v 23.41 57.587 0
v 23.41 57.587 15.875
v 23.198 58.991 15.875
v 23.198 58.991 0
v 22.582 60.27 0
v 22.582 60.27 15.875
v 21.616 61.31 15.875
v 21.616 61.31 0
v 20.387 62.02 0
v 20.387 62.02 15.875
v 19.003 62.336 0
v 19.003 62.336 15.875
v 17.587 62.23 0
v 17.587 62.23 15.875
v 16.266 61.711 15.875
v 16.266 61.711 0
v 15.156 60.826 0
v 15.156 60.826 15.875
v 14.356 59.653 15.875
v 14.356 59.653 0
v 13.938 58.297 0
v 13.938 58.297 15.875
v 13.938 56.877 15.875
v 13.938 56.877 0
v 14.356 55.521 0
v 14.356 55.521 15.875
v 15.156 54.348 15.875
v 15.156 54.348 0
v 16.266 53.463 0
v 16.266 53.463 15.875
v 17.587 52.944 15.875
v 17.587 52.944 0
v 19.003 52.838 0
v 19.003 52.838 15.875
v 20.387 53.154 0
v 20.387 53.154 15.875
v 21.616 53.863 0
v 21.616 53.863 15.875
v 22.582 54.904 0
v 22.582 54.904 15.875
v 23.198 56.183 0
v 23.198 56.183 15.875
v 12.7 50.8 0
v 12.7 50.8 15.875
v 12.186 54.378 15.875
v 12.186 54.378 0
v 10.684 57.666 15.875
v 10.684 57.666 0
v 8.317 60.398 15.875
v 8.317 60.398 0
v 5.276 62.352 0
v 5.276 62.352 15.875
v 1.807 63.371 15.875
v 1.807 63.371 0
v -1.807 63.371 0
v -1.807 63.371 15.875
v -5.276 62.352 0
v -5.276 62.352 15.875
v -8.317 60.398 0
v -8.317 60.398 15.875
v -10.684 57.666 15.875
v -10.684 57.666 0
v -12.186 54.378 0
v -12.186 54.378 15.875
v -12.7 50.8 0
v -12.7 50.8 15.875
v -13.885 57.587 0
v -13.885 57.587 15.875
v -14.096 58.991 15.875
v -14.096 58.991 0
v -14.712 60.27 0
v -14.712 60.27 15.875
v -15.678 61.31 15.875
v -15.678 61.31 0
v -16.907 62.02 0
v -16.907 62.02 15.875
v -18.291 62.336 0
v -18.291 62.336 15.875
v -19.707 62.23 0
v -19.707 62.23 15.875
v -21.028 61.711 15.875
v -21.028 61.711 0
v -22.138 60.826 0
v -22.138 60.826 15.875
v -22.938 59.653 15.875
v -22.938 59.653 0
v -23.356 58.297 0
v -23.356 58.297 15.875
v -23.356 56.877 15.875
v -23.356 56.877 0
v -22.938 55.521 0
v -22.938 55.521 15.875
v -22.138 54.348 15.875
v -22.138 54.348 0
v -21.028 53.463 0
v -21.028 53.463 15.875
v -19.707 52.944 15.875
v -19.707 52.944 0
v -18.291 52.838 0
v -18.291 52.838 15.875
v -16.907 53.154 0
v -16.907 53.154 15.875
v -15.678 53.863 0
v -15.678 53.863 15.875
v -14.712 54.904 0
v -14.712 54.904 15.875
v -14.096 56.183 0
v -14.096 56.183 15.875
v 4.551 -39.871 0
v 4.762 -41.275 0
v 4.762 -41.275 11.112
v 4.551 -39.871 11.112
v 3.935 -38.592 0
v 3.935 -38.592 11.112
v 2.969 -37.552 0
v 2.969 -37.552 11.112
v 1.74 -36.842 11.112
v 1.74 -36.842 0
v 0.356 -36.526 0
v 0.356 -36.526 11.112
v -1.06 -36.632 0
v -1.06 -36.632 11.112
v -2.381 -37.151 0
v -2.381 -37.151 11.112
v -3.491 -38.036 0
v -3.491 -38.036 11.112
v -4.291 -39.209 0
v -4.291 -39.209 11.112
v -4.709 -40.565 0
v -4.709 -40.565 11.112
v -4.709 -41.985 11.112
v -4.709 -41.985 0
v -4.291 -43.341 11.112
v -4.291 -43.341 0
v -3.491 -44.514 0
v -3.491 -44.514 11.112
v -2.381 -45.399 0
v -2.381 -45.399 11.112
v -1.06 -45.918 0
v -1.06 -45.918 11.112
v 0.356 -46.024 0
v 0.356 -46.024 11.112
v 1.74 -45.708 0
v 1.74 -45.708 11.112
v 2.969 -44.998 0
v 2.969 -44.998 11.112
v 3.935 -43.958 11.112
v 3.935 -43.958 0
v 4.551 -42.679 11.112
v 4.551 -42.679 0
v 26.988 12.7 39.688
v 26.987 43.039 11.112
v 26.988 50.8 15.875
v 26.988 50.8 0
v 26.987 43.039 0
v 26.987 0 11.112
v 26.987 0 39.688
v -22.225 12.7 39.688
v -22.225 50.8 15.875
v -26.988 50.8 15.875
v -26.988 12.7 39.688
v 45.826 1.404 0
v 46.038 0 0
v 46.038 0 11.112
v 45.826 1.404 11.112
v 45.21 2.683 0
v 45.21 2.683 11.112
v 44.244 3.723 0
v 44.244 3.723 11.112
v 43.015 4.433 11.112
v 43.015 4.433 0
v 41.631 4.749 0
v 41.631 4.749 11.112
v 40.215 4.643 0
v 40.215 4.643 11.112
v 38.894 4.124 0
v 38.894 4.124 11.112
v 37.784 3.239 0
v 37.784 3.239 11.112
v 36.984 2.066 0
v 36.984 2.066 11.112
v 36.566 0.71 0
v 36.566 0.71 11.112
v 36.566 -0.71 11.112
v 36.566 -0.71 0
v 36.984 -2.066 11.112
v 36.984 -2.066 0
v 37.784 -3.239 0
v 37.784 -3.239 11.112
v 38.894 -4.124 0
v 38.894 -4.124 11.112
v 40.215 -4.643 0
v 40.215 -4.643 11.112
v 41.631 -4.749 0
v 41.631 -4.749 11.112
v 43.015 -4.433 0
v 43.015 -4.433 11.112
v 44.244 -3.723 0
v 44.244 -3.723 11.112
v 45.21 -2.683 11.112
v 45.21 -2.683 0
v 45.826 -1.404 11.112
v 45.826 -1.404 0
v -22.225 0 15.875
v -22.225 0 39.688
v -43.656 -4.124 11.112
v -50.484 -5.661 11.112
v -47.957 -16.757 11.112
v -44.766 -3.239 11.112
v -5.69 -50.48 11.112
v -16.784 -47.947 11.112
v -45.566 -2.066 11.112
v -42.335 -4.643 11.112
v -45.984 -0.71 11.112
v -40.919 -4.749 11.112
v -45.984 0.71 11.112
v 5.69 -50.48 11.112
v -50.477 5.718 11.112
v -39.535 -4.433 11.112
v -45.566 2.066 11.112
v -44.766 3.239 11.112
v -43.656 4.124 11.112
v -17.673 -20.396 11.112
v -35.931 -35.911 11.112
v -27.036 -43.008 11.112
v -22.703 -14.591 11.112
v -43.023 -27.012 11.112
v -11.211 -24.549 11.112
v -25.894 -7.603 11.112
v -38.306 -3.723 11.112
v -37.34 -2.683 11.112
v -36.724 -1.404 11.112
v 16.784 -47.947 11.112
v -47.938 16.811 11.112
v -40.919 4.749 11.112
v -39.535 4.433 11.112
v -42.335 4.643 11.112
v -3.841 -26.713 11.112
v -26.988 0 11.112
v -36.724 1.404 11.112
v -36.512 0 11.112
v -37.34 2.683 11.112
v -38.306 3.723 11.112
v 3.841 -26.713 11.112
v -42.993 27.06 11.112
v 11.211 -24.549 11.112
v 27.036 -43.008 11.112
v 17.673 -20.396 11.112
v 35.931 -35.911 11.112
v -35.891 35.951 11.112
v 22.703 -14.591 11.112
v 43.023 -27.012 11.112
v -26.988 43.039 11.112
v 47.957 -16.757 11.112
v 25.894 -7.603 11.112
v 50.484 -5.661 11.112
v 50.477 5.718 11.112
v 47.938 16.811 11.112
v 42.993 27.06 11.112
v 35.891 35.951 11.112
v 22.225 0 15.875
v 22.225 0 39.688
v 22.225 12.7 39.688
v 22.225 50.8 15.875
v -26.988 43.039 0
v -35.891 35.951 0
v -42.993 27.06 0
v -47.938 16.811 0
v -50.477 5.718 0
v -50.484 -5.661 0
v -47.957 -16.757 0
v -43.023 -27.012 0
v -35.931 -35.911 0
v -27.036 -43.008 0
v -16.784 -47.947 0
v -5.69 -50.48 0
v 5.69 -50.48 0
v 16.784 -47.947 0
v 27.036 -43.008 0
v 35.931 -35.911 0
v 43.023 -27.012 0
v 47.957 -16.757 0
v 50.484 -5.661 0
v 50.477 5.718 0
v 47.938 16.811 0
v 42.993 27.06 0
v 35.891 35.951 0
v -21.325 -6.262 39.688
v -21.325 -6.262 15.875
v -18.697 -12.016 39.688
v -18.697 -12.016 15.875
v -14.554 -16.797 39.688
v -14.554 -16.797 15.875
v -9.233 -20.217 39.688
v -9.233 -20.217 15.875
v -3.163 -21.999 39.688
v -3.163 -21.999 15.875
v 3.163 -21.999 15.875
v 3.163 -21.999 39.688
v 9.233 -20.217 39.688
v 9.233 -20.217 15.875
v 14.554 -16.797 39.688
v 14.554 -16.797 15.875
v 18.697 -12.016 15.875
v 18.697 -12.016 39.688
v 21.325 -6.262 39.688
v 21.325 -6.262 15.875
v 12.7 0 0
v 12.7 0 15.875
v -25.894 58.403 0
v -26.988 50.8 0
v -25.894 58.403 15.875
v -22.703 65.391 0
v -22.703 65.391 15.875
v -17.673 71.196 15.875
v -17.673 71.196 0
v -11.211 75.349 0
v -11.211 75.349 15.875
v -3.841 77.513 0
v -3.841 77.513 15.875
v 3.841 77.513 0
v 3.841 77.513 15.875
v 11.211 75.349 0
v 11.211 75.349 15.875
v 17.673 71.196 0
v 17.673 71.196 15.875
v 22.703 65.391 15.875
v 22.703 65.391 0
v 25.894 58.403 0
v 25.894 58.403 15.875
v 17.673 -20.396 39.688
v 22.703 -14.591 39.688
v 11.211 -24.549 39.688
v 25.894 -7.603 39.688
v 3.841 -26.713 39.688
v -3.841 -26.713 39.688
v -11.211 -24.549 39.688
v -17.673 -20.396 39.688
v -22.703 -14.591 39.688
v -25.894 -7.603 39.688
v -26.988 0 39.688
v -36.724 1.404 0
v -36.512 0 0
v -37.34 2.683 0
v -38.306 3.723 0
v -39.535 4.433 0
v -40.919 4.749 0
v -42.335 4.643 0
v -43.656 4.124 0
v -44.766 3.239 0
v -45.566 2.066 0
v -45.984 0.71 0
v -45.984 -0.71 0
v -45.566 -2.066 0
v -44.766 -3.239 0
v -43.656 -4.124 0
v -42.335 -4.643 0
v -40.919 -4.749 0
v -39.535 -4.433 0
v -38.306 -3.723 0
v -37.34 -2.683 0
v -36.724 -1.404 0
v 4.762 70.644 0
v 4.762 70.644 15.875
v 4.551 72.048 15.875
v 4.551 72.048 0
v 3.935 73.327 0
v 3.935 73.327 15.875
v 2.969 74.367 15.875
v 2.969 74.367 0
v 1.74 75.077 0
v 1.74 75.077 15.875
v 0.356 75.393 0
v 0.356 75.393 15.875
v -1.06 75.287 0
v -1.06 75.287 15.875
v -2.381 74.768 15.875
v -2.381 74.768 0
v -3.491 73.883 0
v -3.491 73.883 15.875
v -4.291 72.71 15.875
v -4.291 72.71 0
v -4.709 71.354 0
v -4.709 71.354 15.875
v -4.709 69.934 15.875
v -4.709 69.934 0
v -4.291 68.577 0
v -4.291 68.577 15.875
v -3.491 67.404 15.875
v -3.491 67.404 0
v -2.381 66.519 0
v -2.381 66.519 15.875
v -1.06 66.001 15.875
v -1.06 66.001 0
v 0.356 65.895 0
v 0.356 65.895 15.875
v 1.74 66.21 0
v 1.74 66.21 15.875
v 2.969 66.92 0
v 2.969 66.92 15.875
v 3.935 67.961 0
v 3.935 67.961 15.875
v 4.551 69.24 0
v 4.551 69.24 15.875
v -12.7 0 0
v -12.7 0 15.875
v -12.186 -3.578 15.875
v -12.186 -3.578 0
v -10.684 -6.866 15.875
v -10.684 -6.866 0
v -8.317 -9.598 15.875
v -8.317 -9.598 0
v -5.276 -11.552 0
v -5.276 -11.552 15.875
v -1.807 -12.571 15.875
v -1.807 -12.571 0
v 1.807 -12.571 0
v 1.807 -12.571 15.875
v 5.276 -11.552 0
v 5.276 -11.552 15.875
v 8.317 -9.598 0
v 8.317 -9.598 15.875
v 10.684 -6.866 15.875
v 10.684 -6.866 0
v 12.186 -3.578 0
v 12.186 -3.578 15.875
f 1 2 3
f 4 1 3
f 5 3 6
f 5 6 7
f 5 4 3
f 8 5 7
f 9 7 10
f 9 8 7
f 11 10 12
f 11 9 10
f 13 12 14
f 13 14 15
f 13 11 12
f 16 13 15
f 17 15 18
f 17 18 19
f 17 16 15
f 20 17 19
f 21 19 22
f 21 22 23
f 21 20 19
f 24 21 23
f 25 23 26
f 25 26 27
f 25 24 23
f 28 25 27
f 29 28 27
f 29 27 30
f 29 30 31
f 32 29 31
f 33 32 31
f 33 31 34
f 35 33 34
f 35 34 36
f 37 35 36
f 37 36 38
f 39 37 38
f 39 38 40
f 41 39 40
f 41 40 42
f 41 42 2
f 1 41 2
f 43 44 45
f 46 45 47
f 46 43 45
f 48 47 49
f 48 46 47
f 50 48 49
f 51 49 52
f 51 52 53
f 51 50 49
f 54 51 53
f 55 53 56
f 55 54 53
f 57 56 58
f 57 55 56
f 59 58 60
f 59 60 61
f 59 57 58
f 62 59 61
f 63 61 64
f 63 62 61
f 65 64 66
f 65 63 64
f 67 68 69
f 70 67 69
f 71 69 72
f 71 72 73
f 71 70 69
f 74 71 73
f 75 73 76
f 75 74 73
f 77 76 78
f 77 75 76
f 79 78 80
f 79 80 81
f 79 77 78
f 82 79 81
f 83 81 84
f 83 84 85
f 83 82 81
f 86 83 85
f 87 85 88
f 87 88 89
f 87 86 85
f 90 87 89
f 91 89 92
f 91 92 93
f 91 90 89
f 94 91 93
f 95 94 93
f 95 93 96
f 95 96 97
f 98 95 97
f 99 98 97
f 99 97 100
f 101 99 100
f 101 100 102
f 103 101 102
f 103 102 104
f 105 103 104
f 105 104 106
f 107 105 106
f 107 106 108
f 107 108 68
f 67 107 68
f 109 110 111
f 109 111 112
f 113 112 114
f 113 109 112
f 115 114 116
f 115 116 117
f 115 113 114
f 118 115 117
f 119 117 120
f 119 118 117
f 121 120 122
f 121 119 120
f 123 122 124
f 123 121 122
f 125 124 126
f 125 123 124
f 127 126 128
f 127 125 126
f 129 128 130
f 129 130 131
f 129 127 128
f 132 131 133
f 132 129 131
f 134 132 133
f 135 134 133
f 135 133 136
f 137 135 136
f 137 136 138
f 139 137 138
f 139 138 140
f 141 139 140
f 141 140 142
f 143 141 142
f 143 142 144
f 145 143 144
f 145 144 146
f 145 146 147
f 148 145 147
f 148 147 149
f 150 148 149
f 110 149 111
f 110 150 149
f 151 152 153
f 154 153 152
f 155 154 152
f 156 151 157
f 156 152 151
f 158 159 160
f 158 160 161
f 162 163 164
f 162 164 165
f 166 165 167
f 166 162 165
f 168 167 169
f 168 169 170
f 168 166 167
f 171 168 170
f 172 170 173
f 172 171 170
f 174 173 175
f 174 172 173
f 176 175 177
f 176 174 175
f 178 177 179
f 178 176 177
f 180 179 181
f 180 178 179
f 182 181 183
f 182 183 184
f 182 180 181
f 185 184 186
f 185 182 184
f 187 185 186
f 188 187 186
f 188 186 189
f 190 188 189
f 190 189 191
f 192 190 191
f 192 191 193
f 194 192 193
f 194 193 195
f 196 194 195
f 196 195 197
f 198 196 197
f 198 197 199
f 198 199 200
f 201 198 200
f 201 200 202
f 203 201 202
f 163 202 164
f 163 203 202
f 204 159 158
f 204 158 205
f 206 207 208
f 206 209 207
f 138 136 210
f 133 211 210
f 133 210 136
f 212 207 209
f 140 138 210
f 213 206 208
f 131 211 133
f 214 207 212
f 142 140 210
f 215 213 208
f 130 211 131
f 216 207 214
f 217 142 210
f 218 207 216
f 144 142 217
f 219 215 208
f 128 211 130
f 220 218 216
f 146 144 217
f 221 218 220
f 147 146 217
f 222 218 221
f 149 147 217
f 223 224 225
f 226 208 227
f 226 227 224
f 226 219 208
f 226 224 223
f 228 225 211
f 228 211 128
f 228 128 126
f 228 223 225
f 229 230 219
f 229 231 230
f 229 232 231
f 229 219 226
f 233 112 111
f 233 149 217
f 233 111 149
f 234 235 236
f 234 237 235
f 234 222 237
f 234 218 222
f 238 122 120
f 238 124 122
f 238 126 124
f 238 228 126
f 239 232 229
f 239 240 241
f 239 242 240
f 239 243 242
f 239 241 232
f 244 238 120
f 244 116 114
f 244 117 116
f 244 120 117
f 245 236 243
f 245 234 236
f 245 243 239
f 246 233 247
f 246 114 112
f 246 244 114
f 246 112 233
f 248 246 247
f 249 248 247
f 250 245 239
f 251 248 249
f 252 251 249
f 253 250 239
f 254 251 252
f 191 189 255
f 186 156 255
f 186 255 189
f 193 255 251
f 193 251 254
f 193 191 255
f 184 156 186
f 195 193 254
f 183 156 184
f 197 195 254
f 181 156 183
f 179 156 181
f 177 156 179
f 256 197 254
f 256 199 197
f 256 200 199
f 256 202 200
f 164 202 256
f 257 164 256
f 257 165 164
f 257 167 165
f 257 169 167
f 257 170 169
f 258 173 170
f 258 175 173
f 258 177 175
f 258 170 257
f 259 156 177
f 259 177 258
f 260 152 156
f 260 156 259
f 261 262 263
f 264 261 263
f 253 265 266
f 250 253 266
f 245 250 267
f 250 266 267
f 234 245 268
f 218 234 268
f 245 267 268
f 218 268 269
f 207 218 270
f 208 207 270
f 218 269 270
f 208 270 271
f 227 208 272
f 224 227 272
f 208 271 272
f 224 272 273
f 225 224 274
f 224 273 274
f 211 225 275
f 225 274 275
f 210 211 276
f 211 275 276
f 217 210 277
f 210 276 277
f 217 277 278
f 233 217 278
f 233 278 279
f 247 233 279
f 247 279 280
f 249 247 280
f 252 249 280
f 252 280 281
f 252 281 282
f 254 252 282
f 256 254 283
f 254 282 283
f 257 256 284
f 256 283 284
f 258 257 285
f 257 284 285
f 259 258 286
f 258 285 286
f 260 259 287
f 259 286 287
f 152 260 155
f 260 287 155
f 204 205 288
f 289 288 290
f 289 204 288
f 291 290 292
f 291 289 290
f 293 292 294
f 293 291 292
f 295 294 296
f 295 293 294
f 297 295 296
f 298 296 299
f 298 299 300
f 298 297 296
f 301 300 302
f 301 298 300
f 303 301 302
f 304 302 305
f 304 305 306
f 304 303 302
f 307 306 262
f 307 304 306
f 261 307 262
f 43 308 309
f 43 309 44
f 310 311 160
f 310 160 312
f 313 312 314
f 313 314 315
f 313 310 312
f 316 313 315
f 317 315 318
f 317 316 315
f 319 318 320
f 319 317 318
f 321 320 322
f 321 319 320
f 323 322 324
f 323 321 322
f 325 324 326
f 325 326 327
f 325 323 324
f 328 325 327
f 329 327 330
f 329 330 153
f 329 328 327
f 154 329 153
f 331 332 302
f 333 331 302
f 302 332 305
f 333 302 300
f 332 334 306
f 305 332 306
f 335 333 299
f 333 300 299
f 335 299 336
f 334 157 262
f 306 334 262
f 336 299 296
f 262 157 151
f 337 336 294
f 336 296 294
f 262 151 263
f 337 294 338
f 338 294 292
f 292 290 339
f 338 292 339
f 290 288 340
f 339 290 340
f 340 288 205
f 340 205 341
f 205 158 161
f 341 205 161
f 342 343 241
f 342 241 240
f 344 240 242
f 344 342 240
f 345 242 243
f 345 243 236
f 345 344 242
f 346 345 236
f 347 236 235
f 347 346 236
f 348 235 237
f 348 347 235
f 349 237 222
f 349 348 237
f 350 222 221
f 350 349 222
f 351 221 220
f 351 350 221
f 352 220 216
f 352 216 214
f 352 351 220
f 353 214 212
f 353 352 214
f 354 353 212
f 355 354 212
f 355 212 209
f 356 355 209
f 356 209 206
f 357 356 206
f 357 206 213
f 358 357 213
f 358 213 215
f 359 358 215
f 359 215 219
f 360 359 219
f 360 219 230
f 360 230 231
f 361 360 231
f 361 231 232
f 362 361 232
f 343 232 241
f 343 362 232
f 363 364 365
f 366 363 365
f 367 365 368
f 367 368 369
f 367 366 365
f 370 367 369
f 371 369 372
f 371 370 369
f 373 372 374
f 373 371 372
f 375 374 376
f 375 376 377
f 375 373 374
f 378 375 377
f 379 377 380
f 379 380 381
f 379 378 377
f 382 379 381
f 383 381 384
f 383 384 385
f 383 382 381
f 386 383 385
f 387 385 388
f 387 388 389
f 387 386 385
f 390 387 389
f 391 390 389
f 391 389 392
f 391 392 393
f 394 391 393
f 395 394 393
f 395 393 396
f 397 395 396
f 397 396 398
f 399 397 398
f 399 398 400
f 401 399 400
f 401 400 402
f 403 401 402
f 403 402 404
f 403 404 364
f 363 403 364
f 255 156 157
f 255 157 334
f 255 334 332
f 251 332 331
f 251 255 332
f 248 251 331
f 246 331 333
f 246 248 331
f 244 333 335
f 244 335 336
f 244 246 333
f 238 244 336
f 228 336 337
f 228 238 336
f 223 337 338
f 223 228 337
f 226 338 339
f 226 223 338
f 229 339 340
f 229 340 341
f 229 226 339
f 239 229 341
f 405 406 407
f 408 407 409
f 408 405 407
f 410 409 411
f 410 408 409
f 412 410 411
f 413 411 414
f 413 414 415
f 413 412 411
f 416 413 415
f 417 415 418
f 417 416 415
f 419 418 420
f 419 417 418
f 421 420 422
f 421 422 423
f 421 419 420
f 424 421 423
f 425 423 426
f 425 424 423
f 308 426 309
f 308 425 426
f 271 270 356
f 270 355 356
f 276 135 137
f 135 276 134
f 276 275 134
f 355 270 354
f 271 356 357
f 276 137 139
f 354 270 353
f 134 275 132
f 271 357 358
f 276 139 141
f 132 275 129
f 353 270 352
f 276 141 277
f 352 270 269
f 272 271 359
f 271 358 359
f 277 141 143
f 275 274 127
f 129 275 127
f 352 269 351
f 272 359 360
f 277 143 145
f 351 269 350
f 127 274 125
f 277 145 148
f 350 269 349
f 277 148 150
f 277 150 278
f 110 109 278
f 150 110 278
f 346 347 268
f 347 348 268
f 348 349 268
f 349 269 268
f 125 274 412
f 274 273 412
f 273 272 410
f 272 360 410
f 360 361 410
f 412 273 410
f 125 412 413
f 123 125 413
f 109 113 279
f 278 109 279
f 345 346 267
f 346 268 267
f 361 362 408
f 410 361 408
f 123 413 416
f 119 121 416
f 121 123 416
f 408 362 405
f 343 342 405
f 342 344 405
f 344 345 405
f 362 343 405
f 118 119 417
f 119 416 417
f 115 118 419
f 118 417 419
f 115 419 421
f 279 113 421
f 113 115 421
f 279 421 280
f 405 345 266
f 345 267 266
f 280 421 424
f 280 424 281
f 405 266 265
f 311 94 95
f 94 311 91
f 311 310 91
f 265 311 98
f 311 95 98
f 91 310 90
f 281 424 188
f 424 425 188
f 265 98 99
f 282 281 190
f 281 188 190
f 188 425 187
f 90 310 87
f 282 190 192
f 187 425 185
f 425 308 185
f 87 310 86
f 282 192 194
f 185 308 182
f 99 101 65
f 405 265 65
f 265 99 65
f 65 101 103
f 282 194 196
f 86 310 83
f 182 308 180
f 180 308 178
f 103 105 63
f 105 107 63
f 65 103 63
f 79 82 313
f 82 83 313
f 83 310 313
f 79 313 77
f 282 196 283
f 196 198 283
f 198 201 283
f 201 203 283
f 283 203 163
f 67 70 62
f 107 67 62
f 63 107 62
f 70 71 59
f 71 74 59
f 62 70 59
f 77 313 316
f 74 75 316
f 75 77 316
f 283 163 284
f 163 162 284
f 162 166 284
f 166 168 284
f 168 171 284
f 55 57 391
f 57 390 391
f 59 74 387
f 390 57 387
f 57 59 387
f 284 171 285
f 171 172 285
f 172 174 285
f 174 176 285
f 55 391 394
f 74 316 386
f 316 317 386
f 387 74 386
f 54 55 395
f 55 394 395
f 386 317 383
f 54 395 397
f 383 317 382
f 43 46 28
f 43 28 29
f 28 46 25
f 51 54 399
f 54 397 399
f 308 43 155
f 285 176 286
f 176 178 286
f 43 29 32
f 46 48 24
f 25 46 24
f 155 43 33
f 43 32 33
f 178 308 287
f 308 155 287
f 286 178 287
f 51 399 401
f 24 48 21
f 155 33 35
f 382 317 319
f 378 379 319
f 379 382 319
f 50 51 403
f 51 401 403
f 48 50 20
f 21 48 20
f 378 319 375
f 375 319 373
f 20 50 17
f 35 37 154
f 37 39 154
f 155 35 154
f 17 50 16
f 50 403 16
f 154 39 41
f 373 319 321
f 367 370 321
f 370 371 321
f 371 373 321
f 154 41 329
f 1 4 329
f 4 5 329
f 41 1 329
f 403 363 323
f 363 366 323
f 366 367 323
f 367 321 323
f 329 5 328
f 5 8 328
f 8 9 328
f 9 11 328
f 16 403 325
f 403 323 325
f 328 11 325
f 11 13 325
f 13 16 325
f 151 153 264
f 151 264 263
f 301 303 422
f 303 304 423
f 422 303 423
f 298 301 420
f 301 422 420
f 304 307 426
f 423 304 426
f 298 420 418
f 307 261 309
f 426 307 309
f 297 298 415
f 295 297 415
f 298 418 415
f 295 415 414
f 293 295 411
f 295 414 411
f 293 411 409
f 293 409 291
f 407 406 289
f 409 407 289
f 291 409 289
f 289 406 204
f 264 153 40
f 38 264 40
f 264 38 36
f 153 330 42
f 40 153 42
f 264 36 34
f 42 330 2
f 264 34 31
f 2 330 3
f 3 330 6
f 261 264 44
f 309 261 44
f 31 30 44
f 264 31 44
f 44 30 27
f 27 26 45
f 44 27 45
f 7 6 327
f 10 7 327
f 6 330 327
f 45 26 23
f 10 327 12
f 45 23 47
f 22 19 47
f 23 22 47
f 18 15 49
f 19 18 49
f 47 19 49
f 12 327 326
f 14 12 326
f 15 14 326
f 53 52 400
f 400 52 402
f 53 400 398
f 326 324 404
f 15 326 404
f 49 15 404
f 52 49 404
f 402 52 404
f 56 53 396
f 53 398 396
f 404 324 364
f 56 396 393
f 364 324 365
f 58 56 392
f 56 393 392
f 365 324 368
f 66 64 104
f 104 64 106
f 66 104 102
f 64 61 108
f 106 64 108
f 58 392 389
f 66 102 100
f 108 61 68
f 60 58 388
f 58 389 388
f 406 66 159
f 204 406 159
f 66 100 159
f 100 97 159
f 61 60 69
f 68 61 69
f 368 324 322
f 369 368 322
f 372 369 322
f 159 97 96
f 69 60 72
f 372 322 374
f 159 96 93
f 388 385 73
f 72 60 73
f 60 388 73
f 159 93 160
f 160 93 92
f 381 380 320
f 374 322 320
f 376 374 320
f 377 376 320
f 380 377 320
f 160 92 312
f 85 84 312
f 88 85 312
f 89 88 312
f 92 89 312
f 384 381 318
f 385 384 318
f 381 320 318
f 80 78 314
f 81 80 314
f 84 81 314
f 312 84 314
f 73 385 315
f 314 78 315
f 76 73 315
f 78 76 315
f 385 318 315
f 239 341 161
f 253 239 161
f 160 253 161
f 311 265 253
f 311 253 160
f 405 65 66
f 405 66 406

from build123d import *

# Parameters (mm, degrees)
SKETCH1_R           = 4.7625
BOSS_EXTRUDE1_DEPTH = 11.1125
SKETCH1_3_R         = 4.7625
BOSS_EXTRUDE2_DEPTH = 15.875
BOSS_EXTRUDE3_DEPTH = 39.6875
CUT_EXTRUDE1_DEPTH  = 117.948227728


with BuildPart() as part:
    # Sketch1 → Boss-Extrude1 (new body)
    with BuildSketch(Plane.XY):
        with BuildLine():
            Line((-26.9875, 50.8), (-26.9875, 43.038527435))
            ThreePointArc((-26.9875, 43.038527435), (0, -50.8), (26.9875, 43.038527435))
            Line((26.9875, 43.038527435), (26.9875, 50.8))
            ThreePointArc((26.9875, 50.8), (0, 77.7875), (-26.9875, 50.8))
        make_face()
        with Locations((0, -41.275)):
            Circle(SKETCH1_R, mode=Mode.SUBTRACT)
        with Locations((-41.275, 0)):
            Circle(SKETCH1_R, mode=Mode.SUBTRACT)
        with Locations((41.275, 0)):
            Circle(SKETCH1_R, mode=Mode.SUBTRACT)
        with BuildLine():
            Line((12.7, 50.8), (12.7, 0))
            ThreePointArc((12.7, 0), (0, -12.7), (-12.7, 0))
            Line((-12.7, 0), (-12.7, 50.8))
            ThreePointArc((-12.7, 50.8), (0, 63.5), (12.7, 50.8))
        make_face(mode=Mode.SUBTRACT)
        with Locations((-18.647025444, 57.586962219)):
            Circle(SKETCH1_R, mode=Mode.SUBTRACT)
        with Locations((0, 70.64375)):
            Circle(SKETCH1_R, mode=Mode.SUBTRACT)
        with Locations((18.647025444, 57.586962219)):
            Circle(SKETCH1_R, mode=Mode.SUBTRACT)
    extrude(amount=BOSS_EXTRUDE1_DEPTH)

    # Sketch1<3> → Boss-Extrude2 (add)
    with BuildSketch(Plane.XY):
        with BuildLine():
            ThreePointArc((-26.9875, 0), (0, -26.9875), (26.9875, 0))
            Line((26.9875, 0), (26.9875, 50.8))
            ThreePointArc((26.9875, 50.8), (0, 77.7875), (-26.9875, 50.8))
            Line((-26.9875, 50.8), (-26.9875, 0))
        make_face()
        with BuildLine():
            Line((12.7, 50.8), (12.7, 0))
            ThreePointArc((12.7, 0), (0, -12.7), (-12.7, 0))
            Line((-12.7, 0), (-12.7, 50.8))
            ThreePointArc((-12.7, 50.8), (0, 63.5), (12.7, 50.8))
        make_face(mode=Mode.SUBTRACT)
        with Locations((-18.647025444, 57.586962219)):
            Circle(SKETCH1_3_R, mode=Mode.SUBTRACT)
        with Locations((0, 70.64375)):
            Circle(SKETCH1_3_R, mode=Mode.SUBTRACT)
        with Locations((18.647025444, 57.586962219)):
            Circle(SKETCH1_3_R, mode=Mode.SUBTRACT)
    extrude(amount=BOSS_EXTRUDE2_DEPTH)

    # Sketch1<4> → Boss-Extrude3 (add)
    with BuildSketch(Plane.XY):
        with BuildLine():
            ThreePointArc((-26.9875, 0), (0, -26.9875), (26.9875, 0))
            Line((26.9875, 0), (26.9875, 43.038527435))
            Line((26.9875, 43.038527435), (26.9875, 50.8))
            Line((26.9875, 50.8), (22.225, 50.8))
            Line((22.225, 50.8), (22.225, 0))
            ThreePointArc((22.225, 0), (0, -22.225), (-22.225, 0))
            Line((-22.225, 0), (-22.225, 50.8))
            Line((-22.225, 50.8), (-26.9875, 50.8))
            Line((-26.9875, 50.8), (-26.9875, 43.038527435))
            Line((-26.9875, 43.038527435), (-26.9875, 0))
        make_face()
    extrude(amount=BOSS_EXTRUDE3_DEPTH)

    # Sketch2 → Cut-Extrude1 (cut, through all)
    with BuildSketch(Plane(origin=(26.9875, 0, 0), x_dir=(0, 0, -1), z_dir=(1, 0, 0))):
        Polygon((-15.875, 50.8), (-39.6875, 12.7), (-39.6875, 50.8), align=None)
    extrude(amount=-CUT_EXTRUDE1_DEPTH, mode=Mode.SUBTRACT)


solid = part.part
